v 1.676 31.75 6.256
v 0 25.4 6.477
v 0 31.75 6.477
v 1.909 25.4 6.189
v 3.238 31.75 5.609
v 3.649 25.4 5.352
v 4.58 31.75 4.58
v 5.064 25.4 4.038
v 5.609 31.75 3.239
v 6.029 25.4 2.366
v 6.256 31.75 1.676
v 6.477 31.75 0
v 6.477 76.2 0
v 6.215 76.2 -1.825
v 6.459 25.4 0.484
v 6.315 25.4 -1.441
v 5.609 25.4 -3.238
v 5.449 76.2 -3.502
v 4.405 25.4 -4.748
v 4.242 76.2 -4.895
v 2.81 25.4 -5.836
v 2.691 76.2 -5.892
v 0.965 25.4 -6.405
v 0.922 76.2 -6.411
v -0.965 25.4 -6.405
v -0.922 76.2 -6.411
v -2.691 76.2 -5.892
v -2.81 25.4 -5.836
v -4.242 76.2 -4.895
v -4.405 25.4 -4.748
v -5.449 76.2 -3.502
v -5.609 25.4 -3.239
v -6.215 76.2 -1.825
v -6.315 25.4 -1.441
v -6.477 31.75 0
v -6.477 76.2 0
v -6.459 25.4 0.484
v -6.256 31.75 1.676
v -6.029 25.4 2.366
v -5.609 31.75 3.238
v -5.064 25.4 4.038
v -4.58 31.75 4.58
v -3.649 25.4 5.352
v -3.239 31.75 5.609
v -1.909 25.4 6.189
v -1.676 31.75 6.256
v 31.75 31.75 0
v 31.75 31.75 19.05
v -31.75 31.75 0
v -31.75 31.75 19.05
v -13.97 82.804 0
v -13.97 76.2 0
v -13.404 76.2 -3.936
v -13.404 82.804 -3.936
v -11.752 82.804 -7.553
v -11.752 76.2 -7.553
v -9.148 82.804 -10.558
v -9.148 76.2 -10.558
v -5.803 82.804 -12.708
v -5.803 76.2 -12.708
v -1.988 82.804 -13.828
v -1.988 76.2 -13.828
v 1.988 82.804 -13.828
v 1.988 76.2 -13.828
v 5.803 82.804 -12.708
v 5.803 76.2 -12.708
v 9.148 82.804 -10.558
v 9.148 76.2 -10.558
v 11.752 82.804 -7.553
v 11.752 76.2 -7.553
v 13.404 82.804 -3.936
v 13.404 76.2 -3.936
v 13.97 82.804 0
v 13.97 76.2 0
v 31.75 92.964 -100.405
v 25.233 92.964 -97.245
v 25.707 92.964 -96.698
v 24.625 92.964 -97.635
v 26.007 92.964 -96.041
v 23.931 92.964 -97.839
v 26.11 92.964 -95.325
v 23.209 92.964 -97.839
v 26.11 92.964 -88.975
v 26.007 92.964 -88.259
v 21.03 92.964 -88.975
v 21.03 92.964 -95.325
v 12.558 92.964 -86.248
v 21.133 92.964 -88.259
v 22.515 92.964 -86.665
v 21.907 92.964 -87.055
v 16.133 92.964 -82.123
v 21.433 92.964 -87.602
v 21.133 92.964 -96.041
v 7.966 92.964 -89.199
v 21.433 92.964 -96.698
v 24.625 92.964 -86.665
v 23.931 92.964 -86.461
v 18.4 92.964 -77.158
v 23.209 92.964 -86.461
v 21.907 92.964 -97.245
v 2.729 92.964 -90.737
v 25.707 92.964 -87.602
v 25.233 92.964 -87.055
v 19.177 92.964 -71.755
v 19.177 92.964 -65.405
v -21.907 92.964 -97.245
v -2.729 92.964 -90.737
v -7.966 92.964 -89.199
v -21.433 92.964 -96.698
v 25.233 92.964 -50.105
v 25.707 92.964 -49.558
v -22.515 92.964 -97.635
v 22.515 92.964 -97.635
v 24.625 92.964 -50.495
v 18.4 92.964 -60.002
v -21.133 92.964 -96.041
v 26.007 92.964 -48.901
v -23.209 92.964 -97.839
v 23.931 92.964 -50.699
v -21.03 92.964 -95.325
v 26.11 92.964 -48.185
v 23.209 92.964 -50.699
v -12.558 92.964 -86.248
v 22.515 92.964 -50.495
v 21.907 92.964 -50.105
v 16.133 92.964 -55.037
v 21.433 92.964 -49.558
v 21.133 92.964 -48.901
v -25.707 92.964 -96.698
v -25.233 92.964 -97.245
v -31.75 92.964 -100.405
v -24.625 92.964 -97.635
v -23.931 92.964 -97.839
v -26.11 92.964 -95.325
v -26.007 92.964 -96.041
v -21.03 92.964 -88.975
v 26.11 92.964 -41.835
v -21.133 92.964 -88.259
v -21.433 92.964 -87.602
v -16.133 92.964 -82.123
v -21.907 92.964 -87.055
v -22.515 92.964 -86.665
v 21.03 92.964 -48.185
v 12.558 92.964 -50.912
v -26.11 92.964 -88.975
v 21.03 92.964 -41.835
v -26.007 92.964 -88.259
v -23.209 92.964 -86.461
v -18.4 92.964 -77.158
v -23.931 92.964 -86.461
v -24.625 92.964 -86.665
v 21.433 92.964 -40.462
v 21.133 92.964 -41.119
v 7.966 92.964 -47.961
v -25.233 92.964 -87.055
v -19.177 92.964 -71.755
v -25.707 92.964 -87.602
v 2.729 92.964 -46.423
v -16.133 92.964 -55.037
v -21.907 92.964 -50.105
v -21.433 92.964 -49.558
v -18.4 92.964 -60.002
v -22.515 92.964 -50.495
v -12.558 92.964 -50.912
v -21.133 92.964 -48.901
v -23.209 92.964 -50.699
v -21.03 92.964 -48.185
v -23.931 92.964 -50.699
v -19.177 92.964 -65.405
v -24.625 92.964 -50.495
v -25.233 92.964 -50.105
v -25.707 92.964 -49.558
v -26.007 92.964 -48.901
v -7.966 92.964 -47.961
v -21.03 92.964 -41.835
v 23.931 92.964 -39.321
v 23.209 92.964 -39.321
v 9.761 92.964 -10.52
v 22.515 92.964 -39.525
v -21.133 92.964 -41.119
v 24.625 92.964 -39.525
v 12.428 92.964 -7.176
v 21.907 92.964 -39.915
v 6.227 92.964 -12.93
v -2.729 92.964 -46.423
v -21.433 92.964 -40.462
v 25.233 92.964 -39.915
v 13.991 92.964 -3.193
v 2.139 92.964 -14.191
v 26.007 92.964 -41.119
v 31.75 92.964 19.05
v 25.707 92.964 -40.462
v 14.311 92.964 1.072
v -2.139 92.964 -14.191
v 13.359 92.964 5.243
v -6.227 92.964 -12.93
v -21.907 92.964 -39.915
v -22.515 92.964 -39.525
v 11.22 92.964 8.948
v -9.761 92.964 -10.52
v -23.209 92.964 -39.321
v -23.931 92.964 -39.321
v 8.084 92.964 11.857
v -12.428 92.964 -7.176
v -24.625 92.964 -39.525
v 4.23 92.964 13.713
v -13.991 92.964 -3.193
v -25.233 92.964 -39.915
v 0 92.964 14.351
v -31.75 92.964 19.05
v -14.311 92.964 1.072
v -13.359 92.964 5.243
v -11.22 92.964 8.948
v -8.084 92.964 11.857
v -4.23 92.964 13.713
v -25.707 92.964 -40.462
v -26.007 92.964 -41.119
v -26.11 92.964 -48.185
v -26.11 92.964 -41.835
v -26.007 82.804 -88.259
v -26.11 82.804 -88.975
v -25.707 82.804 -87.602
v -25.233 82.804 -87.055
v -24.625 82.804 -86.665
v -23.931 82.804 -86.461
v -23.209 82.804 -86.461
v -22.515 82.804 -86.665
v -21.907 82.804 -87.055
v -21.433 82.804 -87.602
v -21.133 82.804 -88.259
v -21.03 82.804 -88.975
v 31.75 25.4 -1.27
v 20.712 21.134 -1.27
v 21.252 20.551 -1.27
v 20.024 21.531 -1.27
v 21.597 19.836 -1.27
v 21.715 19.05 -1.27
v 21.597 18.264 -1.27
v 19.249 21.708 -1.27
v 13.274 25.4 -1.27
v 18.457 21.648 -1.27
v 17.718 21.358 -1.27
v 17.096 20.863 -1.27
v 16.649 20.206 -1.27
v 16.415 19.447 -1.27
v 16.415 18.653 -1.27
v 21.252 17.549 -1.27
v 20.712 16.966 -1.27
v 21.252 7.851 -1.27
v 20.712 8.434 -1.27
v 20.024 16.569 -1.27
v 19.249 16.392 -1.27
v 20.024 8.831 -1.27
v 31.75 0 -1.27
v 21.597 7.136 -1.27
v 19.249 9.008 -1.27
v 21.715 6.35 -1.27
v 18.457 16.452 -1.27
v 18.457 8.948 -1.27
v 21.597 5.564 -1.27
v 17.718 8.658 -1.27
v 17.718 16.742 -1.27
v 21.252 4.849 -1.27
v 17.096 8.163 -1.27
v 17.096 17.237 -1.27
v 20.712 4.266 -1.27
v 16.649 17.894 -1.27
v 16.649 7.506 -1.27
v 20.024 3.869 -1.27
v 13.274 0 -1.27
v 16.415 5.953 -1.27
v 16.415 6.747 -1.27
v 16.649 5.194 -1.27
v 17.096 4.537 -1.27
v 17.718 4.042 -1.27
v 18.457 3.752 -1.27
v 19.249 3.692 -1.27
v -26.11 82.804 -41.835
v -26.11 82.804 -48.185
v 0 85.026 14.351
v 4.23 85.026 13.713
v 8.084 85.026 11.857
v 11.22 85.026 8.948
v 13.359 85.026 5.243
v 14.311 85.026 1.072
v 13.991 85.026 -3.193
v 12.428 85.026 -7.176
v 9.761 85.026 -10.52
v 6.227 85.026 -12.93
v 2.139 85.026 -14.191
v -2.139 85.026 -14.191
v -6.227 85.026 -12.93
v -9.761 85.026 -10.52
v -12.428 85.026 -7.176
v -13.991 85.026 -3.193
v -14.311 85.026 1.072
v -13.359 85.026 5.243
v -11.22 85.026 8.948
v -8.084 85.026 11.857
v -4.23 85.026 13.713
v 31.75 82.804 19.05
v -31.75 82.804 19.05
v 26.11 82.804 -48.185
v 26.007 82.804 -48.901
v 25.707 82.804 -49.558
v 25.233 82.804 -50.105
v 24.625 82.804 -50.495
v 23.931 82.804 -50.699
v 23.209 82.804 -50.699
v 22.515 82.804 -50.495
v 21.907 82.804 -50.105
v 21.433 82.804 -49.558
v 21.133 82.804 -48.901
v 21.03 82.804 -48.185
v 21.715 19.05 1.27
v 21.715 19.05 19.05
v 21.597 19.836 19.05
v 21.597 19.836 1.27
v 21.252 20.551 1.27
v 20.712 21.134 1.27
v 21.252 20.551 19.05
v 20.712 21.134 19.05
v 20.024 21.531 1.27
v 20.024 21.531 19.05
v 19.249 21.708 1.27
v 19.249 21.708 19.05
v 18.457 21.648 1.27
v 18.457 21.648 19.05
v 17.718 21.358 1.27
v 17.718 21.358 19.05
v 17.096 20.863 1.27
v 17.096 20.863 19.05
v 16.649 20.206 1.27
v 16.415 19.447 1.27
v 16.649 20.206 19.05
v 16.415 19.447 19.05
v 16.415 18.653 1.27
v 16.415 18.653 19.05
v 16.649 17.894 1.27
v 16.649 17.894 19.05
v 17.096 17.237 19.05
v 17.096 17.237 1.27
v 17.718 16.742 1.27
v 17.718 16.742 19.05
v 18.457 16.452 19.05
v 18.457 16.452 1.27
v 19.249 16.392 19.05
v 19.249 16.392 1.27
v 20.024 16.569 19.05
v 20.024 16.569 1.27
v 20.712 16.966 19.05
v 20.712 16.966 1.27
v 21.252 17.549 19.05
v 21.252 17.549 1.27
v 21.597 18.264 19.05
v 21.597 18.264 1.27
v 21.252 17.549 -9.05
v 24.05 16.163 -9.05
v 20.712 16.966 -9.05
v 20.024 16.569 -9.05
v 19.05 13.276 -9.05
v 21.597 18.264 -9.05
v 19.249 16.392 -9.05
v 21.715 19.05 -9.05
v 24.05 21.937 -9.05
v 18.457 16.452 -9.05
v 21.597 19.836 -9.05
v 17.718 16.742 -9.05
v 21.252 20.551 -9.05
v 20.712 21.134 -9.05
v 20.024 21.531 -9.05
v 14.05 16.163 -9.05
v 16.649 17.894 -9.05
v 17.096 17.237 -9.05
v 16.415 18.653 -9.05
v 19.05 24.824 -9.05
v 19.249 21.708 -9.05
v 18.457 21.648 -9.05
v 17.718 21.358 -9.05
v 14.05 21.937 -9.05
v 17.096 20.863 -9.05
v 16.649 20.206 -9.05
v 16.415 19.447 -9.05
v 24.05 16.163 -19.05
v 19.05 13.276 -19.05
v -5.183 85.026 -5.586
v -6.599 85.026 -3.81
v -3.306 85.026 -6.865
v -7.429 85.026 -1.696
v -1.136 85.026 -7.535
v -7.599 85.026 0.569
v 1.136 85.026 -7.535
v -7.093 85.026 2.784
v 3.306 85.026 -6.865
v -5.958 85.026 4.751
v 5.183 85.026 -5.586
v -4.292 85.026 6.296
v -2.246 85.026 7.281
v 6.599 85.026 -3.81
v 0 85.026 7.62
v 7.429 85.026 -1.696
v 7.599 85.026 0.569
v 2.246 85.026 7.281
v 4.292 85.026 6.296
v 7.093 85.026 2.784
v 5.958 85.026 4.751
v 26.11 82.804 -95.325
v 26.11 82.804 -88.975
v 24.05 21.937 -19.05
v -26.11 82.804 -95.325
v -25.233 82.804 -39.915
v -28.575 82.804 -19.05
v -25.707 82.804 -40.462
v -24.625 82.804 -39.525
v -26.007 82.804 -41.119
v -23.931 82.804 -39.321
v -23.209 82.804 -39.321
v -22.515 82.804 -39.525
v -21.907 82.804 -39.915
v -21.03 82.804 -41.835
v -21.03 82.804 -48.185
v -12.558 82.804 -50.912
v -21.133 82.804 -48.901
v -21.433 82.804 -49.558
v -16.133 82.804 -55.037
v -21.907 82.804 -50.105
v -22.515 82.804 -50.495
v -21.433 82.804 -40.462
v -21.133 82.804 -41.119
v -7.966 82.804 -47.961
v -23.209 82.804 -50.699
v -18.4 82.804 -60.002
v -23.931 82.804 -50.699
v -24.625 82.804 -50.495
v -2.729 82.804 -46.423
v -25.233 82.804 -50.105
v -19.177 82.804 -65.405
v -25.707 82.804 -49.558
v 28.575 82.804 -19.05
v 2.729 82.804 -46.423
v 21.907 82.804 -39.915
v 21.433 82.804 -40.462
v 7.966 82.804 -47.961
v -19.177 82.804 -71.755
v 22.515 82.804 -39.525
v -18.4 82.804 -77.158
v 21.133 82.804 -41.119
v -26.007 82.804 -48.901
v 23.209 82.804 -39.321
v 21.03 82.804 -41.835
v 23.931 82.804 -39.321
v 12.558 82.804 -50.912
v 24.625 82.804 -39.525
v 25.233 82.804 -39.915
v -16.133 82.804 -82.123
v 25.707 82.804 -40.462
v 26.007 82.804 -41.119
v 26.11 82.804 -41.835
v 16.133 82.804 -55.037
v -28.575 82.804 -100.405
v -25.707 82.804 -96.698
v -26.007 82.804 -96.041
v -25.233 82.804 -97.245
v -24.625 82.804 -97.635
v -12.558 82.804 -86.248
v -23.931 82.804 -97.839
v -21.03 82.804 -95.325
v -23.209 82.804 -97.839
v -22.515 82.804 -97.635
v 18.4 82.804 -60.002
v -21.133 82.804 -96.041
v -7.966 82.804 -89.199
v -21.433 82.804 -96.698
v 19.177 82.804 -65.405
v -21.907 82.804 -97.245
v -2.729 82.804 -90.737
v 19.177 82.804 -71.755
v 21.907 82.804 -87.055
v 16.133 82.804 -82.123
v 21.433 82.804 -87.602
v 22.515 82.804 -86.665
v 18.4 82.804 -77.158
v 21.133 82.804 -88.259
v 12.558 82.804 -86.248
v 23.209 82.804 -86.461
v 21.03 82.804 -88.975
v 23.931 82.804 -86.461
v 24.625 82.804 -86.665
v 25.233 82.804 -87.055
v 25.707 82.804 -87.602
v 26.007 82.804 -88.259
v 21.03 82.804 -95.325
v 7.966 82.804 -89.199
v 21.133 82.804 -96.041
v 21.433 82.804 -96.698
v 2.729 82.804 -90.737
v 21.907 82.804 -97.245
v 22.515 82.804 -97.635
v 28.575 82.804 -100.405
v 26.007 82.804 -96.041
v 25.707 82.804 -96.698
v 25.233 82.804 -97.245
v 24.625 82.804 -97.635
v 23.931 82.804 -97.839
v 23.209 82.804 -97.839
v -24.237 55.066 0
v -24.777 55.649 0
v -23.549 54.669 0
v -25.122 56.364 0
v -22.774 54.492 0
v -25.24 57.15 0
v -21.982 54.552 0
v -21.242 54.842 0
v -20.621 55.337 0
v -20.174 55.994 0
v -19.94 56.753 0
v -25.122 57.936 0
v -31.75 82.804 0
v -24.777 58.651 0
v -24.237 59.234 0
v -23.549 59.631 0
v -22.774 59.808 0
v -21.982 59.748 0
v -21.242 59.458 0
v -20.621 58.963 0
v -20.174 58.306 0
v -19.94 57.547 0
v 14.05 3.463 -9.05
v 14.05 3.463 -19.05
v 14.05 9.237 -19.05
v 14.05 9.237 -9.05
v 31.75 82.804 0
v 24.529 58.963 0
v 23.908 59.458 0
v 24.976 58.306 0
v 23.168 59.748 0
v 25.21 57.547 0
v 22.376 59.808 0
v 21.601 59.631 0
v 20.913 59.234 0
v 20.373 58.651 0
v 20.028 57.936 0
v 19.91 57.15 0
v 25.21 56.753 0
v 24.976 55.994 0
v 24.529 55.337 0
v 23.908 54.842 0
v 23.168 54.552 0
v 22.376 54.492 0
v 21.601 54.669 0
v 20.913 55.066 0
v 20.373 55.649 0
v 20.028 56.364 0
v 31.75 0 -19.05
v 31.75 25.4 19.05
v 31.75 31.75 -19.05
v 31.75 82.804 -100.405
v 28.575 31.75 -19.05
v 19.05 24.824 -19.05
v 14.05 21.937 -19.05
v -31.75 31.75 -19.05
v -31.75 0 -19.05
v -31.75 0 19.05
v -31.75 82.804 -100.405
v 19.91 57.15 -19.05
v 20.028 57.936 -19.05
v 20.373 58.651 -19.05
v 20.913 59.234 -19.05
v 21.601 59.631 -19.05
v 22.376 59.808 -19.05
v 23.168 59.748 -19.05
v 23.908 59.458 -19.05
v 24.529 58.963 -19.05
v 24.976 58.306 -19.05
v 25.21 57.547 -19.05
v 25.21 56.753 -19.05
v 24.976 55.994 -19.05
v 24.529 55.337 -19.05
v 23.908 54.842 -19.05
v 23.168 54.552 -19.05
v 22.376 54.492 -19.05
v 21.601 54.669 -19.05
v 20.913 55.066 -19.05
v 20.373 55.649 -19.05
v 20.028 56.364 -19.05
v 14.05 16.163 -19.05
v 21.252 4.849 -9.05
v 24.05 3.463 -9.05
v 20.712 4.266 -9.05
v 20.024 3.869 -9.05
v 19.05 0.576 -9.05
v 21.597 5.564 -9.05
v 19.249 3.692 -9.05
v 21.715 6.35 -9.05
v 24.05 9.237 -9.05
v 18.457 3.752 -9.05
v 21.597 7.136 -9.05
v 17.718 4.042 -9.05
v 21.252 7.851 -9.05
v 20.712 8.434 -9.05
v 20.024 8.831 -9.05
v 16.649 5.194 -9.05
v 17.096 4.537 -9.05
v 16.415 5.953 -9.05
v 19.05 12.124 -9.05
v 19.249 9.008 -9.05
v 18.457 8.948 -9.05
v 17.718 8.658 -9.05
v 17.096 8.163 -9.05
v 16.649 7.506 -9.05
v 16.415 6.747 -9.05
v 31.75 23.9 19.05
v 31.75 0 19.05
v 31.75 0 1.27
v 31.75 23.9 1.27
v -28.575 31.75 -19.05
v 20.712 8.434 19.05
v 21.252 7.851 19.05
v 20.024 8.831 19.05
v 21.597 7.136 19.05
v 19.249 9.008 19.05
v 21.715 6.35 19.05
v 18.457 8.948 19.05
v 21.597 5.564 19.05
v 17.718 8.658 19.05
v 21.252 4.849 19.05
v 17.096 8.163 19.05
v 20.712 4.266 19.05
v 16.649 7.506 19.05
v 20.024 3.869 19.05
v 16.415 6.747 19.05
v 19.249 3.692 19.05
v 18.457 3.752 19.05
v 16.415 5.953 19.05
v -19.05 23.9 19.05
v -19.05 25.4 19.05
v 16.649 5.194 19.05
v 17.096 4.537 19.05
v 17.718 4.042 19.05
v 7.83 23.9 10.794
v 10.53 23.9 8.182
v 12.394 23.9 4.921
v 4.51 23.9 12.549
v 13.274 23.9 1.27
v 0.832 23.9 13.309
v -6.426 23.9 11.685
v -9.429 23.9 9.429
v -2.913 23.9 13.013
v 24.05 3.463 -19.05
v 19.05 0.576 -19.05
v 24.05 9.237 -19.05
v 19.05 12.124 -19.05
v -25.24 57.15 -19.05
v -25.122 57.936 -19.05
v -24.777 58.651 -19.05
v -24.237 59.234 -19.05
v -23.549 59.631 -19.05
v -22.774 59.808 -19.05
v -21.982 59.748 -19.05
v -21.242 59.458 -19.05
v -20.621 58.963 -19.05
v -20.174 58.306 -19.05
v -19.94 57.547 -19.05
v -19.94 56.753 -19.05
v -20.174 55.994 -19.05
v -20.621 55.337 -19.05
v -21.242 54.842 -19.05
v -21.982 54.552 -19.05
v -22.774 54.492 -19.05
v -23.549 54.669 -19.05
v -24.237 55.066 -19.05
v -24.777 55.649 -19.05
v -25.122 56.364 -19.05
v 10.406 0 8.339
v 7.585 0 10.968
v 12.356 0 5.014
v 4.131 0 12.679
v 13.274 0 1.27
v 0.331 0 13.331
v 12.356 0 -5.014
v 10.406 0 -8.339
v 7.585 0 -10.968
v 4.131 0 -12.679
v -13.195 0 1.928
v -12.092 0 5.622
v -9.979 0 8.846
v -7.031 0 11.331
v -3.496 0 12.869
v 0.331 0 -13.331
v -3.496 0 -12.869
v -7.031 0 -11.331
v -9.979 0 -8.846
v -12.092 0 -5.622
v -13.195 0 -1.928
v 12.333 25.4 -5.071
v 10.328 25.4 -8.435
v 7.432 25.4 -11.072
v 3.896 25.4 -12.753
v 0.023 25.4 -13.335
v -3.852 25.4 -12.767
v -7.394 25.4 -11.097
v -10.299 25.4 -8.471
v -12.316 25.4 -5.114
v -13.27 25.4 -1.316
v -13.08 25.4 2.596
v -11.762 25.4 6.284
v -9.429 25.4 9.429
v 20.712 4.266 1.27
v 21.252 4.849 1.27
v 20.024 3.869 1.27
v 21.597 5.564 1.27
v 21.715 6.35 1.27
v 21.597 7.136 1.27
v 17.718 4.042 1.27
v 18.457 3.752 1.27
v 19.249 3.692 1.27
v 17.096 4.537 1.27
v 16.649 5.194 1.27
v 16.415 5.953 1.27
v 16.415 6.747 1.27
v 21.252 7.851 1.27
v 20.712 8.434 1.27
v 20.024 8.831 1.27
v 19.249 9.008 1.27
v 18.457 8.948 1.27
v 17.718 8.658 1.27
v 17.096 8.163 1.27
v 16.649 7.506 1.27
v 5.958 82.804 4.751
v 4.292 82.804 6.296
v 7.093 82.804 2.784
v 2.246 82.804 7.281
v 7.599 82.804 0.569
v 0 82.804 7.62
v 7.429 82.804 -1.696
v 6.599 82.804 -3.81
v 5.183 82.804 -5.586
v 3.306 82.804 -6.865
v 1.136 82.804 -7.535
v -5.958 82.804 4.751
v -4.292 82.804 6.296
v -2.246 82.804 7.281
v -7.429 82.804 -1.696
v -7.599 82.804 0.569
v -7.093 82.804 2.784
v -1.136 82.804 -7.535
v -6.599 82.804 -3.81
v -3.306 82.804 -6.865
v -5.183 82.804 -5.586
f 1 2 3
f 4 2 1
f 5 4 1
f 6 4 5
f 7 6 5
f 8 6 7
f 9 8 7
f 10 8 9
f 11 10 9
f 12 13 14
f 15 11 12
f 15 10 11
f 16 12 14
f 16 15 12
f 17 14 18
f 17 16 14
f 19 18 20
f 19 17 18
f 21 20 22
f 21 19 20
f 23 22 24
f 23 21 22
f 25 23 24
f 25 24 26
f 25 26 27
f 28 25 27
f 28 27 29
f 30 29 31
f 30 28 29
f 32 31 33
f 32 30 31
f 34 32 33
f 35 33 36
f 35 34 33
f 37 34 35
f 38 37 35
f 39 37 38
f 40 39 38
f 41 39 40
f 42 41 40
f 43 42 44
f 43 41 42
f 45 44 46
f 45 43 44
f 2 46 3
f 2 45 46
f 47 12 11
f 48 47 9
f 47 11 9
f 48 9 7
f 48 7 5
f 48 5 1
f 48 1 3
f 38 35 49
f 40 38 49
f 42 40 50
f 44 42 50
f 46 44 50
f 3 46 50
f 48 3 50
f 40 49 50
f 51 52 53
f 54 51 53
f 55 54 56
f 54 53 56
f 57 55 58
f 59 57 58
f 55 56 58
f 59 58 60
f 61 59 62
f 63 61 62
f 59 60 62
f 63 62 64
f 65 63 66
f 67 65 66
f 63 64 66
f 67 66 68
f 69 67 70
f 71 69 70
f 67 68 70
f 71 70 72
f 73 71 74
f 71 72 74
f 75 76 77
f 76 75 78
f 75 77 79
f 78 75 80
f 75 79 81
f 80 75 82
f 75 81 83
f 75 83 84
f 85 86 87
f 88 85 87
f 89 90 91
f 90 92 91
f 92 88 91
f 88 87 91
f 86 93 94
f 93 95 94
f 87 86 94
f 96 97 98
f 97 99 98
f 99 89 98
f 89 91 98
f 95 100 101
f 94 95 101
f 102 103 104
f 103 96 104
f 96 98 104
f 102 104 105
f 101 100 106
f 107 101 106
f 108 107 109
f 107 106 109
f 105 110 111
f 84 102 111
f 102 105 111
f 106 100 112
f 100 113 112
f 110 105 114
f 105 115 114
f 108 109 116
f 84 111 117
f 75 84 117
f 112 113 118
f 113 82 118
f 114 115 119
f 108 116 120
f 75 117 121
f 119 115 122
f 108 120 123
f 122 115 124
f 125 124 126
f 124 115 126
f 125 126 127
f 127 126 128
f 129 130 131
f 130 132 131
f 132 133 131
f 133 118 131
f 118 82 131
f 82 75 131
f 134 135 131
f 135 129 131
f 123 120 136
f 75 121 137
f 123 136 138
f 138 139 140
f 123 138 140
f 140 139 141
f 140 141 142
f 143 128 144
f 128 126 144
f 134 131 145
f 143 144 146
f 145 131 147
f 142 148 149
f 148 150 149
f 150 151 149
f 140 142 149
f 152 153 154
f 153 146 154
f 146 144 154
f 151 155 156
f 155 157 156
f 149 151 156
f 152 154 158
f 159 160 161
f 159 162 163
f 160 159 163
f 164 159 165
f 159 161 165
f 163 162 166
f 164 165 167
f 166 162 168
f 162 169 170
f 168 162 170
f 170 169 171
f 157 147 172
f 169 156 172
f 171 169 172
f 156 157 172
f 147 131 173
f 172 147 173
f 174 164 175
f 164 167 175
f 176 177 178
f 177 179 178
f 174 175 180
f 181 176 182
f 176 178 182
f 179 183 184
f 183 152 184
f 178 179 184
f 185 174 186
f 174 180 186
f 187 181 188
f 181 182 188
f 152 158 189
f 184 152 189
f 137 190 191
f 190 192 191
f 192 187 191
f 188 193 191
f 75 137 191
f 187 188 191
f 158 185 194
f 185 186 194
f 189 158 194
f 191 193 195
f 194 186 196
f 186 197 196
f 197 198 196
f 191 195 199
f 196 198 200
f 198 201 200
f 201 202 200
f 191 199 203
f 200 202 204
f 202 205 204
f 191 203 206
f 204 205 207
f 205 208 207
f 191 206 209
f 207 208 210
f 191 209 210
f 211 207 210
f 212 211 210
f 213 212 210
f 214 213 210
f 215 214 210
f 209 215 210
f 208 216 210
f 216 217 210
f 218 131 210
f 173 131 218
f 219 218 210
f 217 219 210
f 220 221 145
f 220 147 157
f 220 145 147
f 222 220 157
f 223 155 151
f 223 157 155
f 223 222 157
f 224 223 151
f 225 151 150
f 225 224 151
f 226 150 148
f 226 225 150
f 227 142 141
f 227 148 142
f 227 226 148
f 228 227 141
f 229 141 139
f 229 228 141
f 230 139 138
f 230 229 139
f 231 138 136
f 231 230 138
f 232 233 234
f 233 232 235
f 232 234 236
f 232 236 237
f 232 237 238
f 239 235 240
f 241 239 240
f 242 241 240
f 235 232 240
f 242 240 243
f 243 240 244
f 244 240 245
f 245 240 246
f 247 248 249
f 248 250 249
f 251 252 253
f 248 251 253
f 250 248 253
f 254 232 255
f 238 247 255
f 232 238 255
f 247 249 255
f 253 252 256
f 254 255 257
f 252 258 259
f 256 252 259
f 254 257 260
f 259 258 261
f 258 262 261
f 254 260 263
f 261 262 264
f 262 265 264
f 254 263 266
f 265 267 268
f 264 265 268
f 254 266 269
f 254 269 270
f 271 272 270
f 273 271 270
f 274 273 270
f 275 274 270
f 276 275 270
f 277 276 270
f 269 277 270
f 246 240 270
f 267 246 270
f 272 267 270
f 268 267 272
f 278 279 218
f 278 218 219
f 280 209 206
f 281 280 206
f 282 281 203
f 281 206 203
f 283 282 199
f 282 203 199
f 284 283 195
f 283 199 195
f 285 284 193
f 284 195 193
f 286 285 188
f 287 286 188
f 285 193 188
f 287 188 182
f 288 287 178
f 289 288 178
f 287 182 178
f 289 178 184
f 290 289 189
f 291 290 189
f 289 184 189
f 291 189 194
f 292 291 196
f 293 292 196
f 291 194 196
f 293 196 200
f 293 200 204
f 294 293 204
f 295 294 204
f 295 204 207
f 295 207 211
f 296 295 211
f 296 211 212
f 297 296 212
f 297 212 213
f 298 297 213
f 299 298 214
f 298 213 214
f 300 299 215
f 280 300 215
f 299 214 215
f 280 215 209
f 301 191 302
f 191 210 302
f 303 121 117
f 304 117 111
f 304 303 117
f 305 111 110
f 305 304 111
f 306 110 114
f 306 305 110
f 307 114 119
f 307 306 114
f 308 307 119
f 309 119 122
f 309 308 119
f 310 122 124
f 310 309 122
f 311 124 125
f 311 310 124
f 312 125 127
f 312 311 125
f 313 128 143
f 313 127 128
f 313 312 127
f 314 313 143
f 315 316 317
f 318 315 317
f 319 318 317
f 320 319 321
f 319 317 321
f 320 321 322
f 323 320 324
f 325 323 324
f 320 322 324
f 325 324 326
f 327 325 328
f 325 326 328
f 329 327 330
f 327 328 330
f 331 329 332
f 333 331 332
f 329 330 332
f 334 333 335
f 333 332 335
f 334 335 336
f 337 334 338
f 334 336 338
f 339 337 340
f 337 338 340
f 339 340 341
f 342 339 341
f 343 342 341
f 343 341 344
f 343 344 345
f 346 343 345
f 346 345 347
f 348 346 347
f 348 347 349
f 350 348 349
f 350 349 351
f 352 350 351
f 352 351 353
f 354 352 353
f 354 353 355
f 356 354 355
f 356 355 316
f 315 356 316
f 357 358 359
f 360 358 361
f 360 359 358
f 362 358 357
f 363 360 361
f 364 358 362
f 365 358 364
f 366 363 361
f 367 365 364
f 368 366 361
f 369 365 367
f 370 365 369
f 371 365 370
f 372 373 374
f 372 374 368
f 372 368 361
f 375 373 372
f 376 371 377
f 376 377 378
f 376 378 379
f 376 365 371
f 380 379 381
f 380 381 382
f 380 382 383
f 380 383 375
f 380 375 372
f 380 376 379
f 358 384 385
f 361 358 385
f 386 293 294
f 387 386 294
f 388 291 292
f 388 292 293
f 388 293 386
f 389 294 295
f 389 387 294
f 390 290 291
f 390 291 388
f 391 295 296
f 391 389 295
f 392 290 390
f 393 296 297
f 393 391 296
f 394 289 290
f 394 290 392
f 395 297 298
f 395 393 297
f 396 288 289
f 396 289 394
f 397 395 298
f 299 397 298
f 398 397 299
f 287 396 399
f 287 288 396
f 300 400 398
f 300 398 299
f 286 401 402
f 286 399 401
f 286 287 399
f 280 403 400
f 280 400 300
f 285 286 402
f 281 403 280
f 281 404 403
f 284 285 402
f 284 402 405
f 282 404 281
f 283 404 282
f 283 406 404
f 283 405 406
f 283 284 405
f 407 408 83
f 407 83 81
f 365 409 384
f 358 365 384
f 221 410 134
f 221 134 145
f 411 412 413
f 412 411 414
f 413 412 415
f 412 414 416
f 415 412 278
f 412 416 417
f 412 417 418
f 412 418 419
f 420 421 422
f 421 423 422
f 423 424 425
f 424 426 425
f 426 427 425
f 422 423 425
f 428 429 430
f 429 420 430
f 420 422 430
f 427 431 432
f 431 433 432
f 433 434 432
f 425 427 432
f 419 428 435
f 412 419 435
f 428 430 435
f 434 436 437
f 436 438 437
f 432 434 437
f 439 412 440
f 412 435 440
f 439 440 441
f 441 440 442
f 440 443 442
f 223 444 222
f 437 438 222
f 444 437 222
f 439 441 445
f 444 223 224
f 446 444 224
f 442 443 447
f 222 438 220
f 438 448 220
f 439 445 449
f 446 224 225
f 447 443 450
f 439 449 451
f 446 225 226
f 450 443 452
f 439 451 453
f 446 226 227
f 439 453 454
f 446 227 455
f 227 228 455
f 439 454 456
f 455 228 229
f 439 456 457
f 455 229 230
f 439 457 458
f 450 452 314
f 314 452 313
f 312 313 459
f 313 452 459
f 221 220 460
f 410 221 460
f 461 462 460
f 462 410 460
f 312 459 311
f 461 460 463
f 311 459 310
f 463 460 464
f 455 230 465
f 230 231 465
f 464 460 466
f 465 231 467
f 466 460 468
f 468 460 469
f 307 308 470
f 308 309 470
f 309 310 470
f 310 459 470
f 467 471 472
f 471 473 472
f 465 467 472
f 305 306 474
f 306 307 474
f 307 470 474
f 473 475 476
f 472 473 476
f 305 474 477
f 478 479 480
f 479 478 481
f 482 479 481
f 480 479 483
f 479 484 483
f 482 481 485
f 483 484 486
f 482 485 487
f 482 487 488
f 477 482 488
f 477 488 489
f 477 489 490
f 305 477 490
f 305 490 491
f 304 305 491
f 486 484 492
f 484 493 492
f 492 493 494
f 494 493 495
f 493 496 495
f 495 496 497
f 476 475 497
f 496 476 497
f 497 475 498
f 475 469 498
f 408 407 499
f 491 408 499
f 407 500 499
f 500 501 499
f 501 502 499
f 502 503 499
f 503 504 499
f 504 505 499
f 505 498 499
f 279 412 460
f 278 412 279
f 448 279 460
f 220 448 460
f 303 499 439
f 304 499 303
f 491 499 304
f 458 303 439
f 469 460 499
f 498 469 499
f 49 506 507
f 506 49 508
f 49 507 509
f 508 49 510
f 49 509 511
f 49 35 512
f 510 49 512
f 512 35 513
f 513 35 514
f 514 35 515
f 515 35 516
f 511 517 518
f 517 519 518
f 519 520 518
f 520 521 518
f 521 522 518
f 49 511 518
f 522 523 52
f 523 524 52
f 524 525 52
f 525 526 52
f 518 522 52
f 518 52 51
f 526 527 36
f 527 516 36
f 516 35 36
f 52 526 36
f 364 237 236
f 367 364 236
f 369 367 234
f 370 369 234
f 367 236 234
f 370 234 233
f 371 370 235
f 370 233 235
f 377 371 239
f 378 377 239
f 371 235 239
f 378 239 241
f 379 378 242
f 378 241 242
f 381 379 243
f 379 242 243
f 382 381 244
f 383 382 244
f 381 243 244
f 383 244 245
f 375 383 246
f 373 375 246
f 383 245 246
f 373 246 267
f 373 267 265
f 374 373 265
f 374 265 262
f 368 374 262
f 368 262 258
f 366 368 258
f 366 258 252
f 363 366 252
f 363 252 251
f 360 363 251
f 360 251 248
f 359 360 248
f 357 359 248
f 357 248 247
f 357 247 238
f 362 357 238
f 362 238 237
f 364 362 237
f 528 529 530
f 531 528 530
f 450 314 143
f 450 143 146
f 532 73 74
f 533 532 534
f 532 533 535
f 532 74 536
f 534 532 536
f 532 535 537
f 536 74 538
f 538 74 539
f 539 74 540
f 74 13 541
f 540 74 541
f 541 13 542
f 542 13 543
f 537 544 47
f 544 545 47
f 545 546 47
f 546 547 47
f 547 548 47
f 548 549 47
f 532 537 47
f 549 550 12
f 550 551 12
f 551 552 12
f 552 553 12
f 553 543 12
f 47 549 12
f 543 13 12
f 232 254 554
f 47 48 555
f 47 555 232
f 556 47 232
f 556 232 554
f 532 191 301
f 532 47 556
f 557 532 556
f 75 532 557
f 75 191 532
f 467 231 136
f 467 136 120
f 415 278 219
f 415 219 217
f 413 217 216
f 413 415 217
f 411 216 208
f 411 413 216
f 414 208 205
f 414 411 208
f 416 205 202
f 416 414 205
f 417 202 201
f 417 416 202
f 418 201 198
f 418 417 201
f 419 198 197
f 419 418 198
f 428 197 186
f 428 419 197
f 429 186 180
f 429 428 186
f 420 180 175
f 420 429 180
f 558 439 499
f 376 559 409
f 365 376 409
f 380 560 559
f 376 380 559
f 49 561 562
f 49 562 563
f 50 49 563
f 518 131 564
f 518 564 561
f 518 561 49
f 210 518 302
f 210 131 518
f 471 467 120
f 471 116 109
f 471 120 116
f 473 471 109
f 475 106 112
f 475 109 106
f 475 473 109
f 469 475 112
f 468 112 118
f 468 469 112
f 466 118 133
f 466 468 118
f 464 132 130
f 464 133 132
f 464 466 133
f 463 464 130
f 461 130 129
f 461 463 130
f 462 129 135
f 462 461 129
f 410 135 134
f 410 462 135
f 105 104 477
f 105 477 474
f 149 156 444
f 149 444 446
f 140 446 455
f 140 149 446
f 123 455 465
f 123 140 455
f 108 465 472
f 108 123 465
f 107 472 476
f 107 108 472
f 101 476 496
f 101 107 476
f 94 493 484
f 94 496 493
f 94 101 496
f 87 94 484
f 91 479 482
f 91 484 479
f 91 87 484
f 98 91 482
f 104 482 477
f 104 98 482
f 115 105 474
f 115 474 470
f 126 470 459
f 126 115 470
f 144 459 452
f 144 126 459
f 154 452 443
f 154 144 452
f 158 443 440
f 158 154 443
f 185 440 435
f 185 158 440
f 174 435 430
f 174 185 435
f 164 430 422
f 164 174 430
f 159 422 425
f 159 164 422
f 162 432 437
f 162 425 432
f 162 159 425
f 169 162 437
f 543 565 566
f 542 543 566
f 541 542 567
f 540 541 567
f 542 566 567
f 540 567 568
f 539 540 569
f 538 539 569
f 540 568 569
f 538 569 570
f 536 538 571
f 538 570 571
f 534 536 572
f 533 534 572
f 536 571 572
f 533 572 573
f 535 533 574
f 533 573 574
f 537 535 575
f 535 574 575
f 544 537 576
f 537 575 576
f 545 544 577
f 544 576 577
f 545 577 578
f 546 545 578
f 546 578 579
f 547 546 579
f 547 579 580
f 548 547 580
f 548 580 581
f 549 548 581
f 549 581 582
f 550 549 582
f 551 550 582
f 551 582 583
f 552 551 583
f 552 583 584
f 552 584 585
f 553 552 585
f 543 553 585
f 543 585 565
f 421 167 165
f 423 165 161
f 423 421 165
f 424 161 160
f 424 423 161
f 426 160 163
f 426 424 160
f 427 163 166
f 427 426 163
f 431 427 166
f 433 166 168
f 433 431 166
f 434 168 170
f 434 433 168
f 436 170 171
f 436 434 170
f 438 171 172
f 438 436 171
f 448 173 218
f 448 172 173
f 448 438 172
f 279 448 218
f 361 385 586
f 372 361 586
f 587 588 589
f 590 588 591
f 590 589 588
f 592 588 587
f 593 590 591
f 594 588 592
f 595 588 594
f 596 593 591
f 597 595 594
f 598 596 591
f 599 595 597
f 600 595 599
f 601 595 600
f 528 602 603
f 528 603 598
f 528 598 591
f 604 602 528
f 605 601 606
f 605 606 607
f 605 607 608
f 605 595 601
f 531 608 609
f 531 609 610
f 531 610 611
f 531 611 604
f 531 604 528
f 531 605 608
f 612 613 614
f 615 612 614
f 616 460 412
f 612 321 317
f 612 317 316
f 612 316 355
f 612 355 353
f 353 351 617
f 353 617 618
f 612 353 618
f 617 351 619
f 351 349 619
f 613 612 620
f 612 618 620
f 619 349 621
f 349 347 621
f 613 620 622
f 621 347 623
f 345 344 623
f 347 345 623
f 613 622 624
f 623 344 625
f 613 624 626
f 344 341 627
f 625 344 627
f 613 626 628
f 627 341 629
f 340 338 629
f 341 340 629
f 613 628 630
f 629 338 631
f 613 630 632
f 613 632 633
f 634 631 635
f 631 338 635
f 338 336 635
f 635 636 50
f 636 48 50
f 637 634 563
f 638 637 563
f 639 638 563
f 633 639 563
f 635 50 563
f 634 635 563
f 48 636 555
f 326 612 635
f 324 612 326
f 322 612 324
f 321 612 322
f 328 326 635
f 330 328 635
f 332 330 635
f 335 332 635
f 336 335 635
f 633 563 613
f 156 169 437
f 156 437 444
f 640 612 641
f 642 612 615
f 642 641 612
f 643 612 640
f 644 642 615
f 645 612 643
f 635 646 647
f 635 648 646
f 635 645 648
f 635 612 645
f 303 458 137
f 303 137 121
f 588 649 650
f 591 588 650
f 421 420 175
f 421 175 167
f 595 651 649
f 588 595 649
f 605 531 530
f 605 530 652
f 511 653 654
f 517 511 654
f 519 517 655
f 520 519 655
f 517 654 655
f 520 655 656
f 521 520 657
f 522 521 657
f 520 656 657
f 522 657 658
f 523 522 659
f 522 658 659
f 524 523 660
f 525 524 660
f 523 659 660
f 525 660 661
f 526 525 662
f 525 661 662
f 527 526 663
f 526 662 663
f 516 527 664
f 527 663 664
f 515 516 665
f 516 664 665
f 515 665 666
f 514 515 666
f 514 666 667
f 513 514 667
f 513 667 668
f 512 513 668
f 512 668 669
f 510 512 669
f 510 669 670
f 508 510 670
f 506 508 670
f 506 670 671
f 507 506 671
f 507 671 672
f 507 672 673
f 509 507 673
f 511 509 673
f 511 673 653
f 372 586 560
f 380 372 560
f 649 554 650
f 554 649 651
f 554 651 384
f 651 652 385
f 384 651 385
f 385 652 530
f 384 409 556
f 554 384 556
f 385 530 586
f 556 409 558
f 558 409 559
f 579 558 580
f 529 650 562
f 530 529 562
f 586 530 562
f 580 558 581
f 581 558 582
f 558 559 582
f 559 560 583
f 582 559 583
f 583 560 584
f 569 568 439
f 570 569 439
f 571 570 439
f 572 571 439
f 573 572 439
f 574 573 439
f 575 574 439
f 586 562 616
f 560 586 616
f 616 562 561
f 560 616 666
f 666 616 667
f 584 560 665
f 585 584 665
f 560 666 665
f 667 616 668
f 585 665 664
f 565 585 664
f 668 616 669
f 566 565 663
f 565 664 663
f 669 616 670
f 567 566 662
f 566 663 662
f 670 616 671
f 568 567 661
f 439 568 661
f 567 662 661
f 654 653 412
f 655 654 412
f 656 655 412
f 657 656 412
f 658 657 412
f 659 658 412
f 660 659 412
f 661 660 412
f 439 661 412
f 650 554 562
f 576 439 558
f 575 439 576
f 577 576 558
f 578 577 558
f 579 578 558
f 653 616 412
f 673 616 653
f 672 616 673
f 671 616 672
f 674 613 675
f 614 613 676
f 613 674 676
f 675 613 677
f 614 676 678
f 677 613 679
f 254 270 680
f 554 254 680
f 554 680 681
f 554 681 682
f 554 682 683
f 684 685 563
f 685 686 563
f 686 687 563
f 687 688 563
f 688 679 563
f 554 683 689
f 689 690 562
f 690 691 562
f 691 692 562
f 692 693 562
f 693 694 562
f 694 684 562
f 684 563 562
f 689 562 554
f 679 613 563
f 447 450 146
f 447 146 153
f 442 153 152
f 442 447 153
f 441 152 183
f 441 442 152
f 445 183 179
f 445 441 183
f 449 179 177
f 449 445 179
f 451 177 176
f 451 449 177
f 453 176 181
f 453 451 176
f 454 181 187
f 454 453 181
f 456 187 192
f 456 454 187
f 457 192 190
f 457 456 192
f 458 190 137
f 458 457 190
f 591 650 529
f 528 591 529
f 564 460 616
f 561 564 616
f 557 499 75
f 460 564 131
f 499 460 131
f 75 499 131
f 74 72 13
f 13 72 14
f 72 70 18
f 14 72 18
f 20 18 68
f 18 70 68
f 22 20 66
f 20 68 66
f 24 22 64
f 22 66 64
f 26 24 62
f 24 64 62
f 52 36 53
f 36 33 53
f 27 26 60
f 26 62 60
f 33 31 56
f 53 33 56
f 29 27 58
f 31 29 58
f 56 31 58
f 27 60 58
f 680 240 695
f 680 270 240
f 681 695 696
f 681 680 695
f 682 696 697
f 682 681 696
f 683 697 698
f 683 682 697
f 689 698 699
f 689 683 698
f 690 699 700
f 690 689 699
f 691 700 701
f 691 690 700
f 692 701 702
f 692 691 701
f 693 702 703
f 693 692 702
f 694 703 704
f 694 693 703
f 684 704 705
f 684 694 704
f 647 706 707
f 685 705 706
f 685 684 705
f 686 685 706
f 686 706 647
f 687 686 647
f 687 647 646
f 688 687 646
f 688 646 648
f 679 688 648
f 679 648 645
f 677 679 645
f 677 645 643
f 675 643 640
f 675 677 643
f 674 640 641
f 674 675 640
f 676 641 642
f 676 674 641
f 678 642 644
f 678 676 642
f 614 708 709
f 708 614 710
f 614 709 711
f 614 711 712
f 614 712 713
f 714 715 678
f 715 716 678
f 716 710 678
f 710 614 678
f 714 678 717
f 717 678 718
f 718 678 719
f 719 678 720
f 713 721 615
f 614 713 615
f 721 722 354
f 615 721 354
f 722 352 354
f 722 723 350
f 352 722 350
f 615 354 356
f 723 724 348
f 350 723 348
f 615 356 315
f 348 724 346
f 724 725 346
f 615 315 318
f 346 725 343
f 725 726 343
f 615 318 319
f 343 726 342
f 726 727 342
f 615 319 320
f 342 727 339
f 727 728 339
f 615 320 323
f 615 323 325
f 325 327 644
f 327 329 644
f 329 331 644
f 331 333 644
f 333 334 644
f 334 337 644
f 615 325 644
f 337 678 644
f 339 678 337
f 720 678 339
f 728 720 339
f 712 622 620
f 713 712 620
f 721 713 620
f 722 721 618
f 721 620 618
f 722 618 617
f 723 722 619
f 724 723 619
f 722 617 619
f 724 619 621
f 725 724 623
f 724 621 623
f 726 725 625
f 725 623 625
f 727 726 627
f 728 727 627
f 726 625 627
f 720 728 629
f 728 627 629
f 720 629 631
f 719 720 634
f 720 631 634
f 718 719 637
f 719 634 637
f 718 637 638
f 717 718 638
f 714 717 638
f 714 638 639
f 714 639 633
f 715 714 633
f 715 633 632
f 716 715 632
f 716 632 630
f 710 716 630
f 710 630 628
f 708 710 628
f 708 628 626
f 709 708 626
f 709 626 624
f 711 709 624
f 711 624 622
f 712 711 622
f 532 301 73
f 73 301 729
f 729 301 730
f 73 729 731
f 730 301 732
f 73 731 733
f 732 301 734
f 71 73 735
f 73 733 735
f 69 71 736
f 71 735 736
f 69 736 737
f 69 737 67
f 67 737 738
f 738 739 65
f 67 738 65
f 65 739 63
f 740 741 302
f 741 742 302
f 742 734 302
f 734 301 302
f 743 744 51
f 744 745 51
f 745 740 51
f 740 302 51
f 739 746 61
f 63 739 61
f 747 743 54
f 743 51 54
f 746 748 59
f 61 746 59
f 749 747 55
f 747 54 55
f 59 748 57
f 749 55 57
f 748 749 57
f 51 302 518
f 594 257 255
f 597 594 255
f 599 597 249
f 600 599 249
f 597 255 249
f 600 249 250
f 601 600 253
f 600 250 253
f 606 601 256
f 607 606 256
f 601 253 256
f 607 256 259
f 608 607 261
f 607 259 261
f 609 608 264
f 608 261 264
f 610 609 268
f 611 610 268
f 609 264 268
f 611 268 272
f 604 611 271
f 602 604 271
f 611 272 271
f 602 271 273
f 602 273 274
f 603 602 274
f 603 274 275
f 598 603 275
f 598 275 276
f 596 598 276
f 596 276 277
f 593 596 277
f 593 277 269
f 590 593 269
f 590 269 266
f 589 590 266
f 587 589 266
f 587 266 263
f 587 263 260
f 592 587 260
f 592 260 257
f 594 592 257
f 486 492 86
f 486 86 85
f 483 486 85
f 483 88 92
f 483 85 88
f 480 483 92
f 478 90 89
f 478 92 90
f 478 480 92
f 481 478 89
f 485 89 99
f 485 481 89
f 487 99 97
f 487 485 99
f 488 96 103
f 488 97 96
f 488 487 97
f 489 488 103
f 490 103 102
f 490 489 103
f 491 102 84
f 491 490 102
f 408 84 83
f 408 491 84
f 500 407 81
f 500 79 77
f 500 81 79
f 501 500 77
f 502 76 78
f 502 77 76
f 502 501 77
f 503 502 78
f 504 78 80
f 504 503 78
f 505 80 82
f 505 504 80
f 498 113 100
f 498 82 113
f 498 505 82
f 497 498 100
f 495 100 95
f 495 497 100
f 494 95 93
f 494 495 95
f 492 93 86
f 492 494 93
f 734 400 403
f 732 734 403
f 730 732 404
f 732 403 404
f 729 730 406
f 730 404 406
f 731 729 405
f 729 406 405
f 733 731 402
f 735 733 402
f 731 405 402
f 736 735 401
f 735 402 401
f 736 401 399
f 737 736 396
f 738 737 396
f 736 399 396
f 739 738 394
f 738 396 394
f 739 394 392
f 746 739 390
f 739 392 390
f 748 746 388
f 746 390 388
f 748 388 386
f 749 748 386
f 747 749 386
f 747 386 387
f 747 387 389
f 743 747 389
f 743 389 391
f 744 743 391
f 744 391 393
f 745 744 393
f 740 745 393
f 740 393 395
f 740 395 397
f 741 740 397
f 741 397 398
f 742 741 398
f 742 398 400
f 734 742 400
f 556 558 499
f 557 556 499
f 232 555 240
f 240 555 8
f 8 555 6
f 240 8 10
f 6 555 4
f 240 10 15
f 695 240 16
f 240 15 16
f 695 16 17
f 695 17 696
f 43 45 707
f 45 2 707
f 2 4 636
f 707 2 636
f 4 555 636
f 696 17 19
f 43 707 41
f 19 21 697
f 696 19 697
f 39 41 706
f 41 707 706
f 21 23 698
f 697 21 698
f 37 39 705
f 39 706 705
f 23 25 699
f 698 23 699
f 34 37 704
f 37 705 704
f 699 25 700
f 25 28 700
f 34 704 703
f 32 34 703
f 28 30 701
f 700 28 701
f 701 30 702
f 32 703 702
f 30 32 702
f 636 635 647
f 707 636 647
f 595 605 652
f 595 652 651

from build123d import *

# Parameters (mm, degrees)
SKETCH1_W            = 50.8
SKETCH1_H            = 38.1
SKETCH1_R            = 13.335
BOSS_EXTRUDE2_DEPTH  = 25.4
CUT_EXTRUDE1_REACH   = 42.66
SKETCH2_W            = 25.4
SKETCH2_H            = 2.54
SKETCH3_R            = 2.665
CUT_EXTRUDE2_DEPTH   = 53.363441445
CUT_EXTRUDE3_DEPTH   = 10
CUT_EXTRUDE4_START   = -1.5
CUT_EXTRUDE4_DEPTH   = 1.5
SKETCH6_W            = 50.8
SKETCH6_H            = 38.1
SKETCH6_R            = 6.477
BOSS_EXTRUDE3_DEPTH  = 6.35
BOSS_EXTRUDE4_DEPTH  = 44.45
BOSS_EXTRUDE5_DEPTH  = 6.604
SKETCH11_W           = 57.15
SKETCH11_H           = 127
BOSS_EXTRUDE6_DEPTH  = 10.16
CUT_EXTRUDE6_REACH   = 147.3
SKETCH12_R           = 7.62
SKETCH13_R           = 14.351
CUT_EXTRUDE7_DEPTH   = 7.9375
CUT_EXTRUDE8_REACH   = 147.3
CUT_EXTRUDE11_REACH  = 141.019
CUT_EXTRUDE12_REACH  = 147.3
SKETCH16_W           = 57.15
SKETCH16_H           = 7.545
SKETCH17_W           = 17.78
SKETCH17_H           = 23.9
BOSS_EXTRUDE7_DEPTH  = 3.175
BOSS_EXTRUDE8_DEPTH  = 3.175
BOSS_EXTRUDE10_DEPTH = 3.175
SKETCH20_W           = 17.78
SKETCH20_H           = 23.9
BOSS_EXTRUDE11_DEPTH = 3.175
CUT_EXTRUDE13_REACH  = 129.55
SKETCH21_R           = 2.665


with BuildPart() as part:
    # Sketch1 → Boss-Extrude2 (new body)
    with BuildSketch(Plane(origin=(0, 0, 0), x_dir=(1, 0, 0), z_dir=(0, 1, 0))):
        Rectangle(SKETCH1_W, SKETCH1_H)
        with Locations(Location((0, 0, 0), (0, 0, 270))):
            Circle(SKETCH1_R, mode=Mode.SUBTRACT)
    extrude(amount=BOSS_EXTRUDE2_DEPTH)

    # Sketch2 → Cut-Extrude1 (cut, up to next)
    with BuildSketch(Plane(origin=(0, 25.4, 0), x_dir=(1, 0, 0), z_dir=(0, 1, 0)), mode=Mode.PRIVATE) as cut_extrude1_sk1:
        with Locations((12.7, 0)):
            Rectangle(SKETCH2_W, SKETCH2_H)
    cut_extrude1_tool1 = extrude(cut_extrude1_sk1.sketch, amount=-CUT_EXTRUDE1_REACH, mode=Mode.PRIVATE) & part.part
    add(cut_extrude1_tool1.solids().sort_by_distance((12.7, 25.4, 0))[0], mode=Mode.SUBTRACT)

    # Sketch3 → Cut-Extrude2 (cut, through all)
    with BuildSketch(Plane.XY.offset(19.05)):
        with Locations((19.05, 19.05)):
            Circle(SKETCH3_R)
        with Locations((19.05, 6.35)):
            Circle(SKETCH3_R)
    extrude(amount=-CUT_EXTRUDE2_DEPTH, mode=Mode.SUBTRACT)

    # Sketch4 → Cut-Extrude3 (cut)
    with BuildSketch(Plane(origin=(0, 0, -19.05), x_dir=(-1, 0, 0), z_dir=(0, 0, -1))):
        Polygon((-19.05, 24.823502692), (-24.05, 21.936751346), (-24.05, 16.163248654), (-19.05, 13.276497308), (-14.05, 16.163248654), (-14.05, 21.936751346), align=None)
        Polygon((-19.05, 12.123502692), (-24.05, 9.236751346), (-24.05, 3.463248654), (-19.05, 0.576497308), (-14.05, 3.463248654), (-14.05, 9.236751346), align=None)
    extrude(amount=-CUT_EXTRUDE3_DEPTH, mode=Mode.SUBTRACT)

    # Sketch5 → Cut-Extrude4 (cut)
    with BuildSketch(Plane(origin=(0, 25.4, 0), x_dir=(1, 0, 0), z_dir=(0, 1, 0)).offset(CUT_EXTRUDE4_START)):
        with BuildLine():
            Line((-19.05, -19.05), (-9.429268927, -9.429268927))
            ThreePointArc((-9.429268927, -9.429268927), (4.509949975, -12.549206199), (13.27438605, -1.27))
            Line((13.27438605, -1.27), (25.4, -1.27))
            Line((25.4, -1.27), (25.4, -19.05))
            Line((25.4, -19.05), (-19.05, -19.05))
        make_face()
    extrude(amount=CUT_EXTRUDE4_DEPTH, mode=Mode.SUBTRACT)

    # Sketch6 → Boss-Extrude3 (add)
    with BuildSketch(Plane(origin=(0, 25.4, 0), x_dir=(1, 0, 0), z_dir=(0, 1, 0))):
        Rectangle(SKETCH6_W, SKETCH6_H)
        with Locations(Location((0, 0, 0), (0, 0, 270))):
            Circle(SKETCH6_R, mode=Mode.SUBTRACT)
    extrude(amount=BOSS_EXTRUDE3_DEPTH)

    # Sketch8 → Boss-Extrude4 (add)
    with BuildSketch(Plane(origin=(0, 31.75, 0), x_dir=(1, 0, 0), z_dir=(0, 1, 0))):
        with BuildLine():
            Line((-25.4, 19.05), (25.4, 19.05))
            Line((25.4, 19.05), (25.4, 0))
            Line((25.4, 0), (6.477, 0))
            ThreePointArc((6.477, 0), (0, 6.477), (-6.477, 0))
            Line((-6.477, 0), (-25.4, 0))
            Line((-25.4, 0), (-25.4, 19.05))
        make_face()
    extrude(amount=BOSS_EXTRUDE4_DEPTH)

    # Sketch10 → Boss-Extrude5 (add)
    with BuildSketch(Plane(origin=(0, 76.2, 0), x_dir=(1, 0, 0), z_dir=(0, 1, 0))):
        with BuildLine():
            Line((-25.4, 19.05), (-25.4, 0))
            Line((-25.4, 0), (-13.97, 0))
            ThreePointArc((-13.97, 0), (0, 13.97), (13.97, 0))
            Line((13.97, 0), (25.4, 0))
            Line((25.4, 0), (25.4, 19.05))
            Line((25.4, 19.05), (-25.4, 19.05))
        make_face()
    extrude(amount=BOSS_EXTRUDE5_DEPTH)

    # Sketch11 → Boss-Extrude6 (add)
    with BuildSketch(Plane(origin=(0, 82.804, 0), x_dir=(1, 0, 0), z_dir=(0, 1, 0))):
        with Locations((0, 44.45)):
            Rectangle(SKETCH11_W, SKETCH11_H)
    extrude(amount=BOSS_EXTRUDE6_DEPTH)

    # Sketch12 → Cut-Extrude6 (cut, up to next)
    with BuildSketch(Plane(origin=(0, 92.964, 0), x_dir=(1, 0, 0), z_dir=(0, 1, 0)), mode=Mode.PRIVATE) as cut_extrude6_sk1:
        with Locations(Location((0, 0, 0), (0, 0, 270))):
            Circle(SKETCH12_R)
    cut_extrude6_tool1 = extrude(cut_extrude6_sk1.sketch, amount=-CUT_EXTRUDE6_REACH, mode=Mode.PRIVATE) & part.part
    add(cut_extrude6_tool1.solids().sort_by_distance((0, 92.964, 0))[0], mode=Mode.SUBTRACT)

    # Sketch13 → Cut-Extrude7 (cut)
    with BuildSketch(Plane(origin=(0, 92.964, 0), x_dir=(1, 0, 0), z_dir=(0, 1, 0))):
        with Locations(Location((0, 0, 0), (0, 0, 270))):
            Circle(SKETCH13_R)
    extrude(amount=-CUT_EXTRUDE7_DEPTH, mode=Mode.SUBTRACT)

    # Sketch14 → Cut-Extrude8 (cut, up to next)
    with BuildSketch(Plane(origin=(0, 92.964, 0), x_dir=(1, 0, 0), z_dir=(0, 1, 0)), mode=Mode.PRIVATE) as cut_extrude8_sk1:
        with BuildLine():
            Line((-19.177, 65.405), (-19.177, 71.755))
            ThreePointArc((-19.177, 71.755), (0, 90.932), (19.177, 71.755))
            Line((19.177, 71.755), (19.177, 65.405))
            ThreePointArc((19.177, 65.405), (0, 46.228), (-19.177, 65.405))
        make_face()
    cut_extrude8_tool1 = extrude(cut_extrude8_sk1.sketch, amount=-CUT_EXTRUDE8_REACH, mode=Mode.PRIVATE) & part.part
    add(cut_extrude8_tool1.solids().sort_by_distance((0, 92.964, -68.58))[0], mode=Mode.SUBTRACT)

    # Sketch15 → Cut-Extrude11 (cut, up to next)
    with BuildSketch(Plane.XZ.offset(-82.804), mode=Mode.PRIVATE) as cut_extrude11_sk1:
        with BuildLine():
            Line((-21.03, -88.975), (-21.03, -95.325))
            ThreePointArc((-21.03, -95.325), (-23.57, -97.865), (-26.11, -95.325))
            Line((-26.11, -95.325), (-26.11, -88.975))
            ThreePointArc((-26.11, -88.975), (-23.57, -86.435), (-21.03, -88.975))
        make_face()
    cut_extrude11_tool1 = extrude(cut_extrude11_sk1.sketch, amount=-CUT_EXTRUDE11_REACH, mode=Mode.PRIVATE) & part.part
    # Sketch15 → Cut-Extrude11 (cut, up to next)
    with BuildSketch(Plane.XZ.offset(-82.804), mode=Mode.PRIVATE) as cut_extrude11_sk2:
        with BuildLine():
            Line((26.11, -88.975), (26.11, -95.325))
            ThreePointArc((26.11, -95.325), (23.57, -97.865), (21.03, -95.325))
            Line((21.03, -95.325), (21.03, -88.975))
            ThreePointArc((21.03, -88.975), (23.57, -86.435), (26.11, -88.975))
        make_face()
    cut_extrude11_tool2 = extrude(cut_extrude11_sk2.sketch, amount=-CUT_EXTRUDE11_REACH, mode=Mode.PRIVATE) & part.part
    # Sketch15 → Cut-Extrude11 (cut, up to next)
    with BuildSketch(Plane.XZ.offset(-82.804), mode=Mode.PRIVATE) as cut_extrude11_sk3:
        with BuildLine():
            Line((26.11, -41.835), (26.11, -48.185))
            ThreePointArc((26.11, -48.185), (23.57, -50.725), (21.03, -48.185))
            Line((21.03, -48.185), (21.03, -41.835))
            ThreePointArc((21.03, -41.835), (23.57, -39.295), (26.11, -41.835))
        make_face()
    cut_extrude11_tool3 = extrude(cut_extrude11_sk3.sketch, amount=-CUT_EXTRUDE11_REACH, mode=Mode.PRIVATE) & part.part
    # Sketch15 → Cut-Extrude11 (cut, up to next)
    with BuildSketch(Plane.XZ.offset(-82.804), mode=Mode.PRIVATE) as cut_extrude11_sk4:
        with BuildLine():
            Line((-21.03, -41.835), (-21.03, -48.185))
            ThreePointArc((-21.03, -48.185), (-23.57, -50.725), (-26.11, -48.185))
            Line((-26.11, -48.185), (-26.11, -41.835))
            ThreePointArc((-26.11, -41.835), (-23.57, -39.295), (-21.03, -41.835))
        make_face()
    cut_extrude11_tool4 = extrude(cut_extrude11_sk4.sketch, amount=-CUT_EXTRUDE11_REACH, mode=Mode.PRIVATE) & part.part
    add(cut_extrude11_tool1.solids().sort_by_distance((-23.57, 82.804, -92.15))[0], mode=Mode.SUBTRACT)
    add(cut_extrude11_tool2.solids().sort_by_distance((23.57, 82.804, -92.15))[0], mode=Mode.SUBTRACT)
    add(cut_extrude11_tool3.solids().sort_by_distance((23.57, 82.804, -45.01))[0], mode=Mode.SUBTRACT)
    add(cut_extrude11_tool4.solids().sort_by_distance((-23.57, 82.804, -45.01))[0], mode=Mode.SUBTRACT)

    # Sketch16 → Cut-Extrude12 (cut, up to next)
    with BuildSketch(Plane(origin=(0, 92.964, 0), x_dir=(1, 0, 0), z_dir=(0, 1, 0)), mode=Mode.PRIVATE) as cut_extrude12_sk1:
        with Locations((0, 104.1775)):
            Rectangle(SKETCH16_W, SKETCH16_H)
    cut_extrude12_tool1 = extrude(cut_extrude12_sk1.sketch, amount=-CUT_EXTRUDE12_REACH, mode=Mode.PRIVATE) & part.part
    add(cut_extrude12_tool1.solids().sort_by_distance((0, 92.964, -104.1775))[0], mode=Mode.SUBTRACT)

    # Sketch17 → Boss-Extrude7 (add)
    with BuildSketch(Plane(origin=(25.4, 0, 0), x_dir=(0, 0, -1), z_dir=(1, 0, 0))):
        with Locations((-10.16, 11.95)):
            Rectangle(SKETCH17_W, SKETCH17_H)
        Polygon((19.05, 0), (19.05, 82.804), (0, 82.804), (0, 31.75), (-19.05, 31.75), (-19.05, 25.4), (1.27, 25.4), (1.27, 0), align=None)
    extrude(amount=BOSS_EXTRUDE7_DEPTH)

    # Sketch18 → Boss-Extrude8 (add)
    with BuildSketch(Plane.ZY.offset(25.4)):
        Polygon((-19.05, 0), (19.05, 0), (19.05, 31.75), (0, 31.75), (0, 82.804), (-19.05, 82.804), align=None)
    extrude(amount=BOSS_EXTRUDE8_DEPTH)

    # Sketch19 → Boss-Extrude10 (add)
    with BuildSketch(Plane.ZY.offset(28.575)):
        Polygon((0, 92.964), (-100.405, 92.964), (-100.405, 82.804), (-19.05, 82.804), (-19.05, 31.75), (0, 31.75), (0, 82.804), (19.05, 82.804), (19.05, 92.964), align=None)
        Polygon((0, 31.75), (-19.05, 31.75), (-19.05, 0), (19.05, 0), (19.05, 31.75), align=None)
        Polygon((-19.05, 82.804), (-100.405, 82.804), (-19.05, 31.75), align=None)
    extrude(amount=BOSS_EXTRUDE10_DEPTH)

    # Sketch20 → Boss-Extrude11 (add)
    with BuildSketch(Plane(origin=(28.575, 0, 0), x_dir=(0, 0, -1), z_dir=(1, 0, 0))):
        Polygon((19.05, 31.75), (100.405, 82.804), (100.405, 92.964), (-19.05, 92.964), (-19.05, 82.804), (0, 82.804), (0, 31.75), (-19.05, 31.75), (-19.05, 25.4), (1.27, 25.4), (1.27, 0), (19.05, 0), align=None)
        with Locations((-10.16, 11.95)):
            Rectangle(SKETCH20_W, SKETCH20_H)
    extrude(amount=BOSS_EXTRUDE11_DEPTH)

    # Sketch21 → Cut-Extrude13 (cut, up to next)
    with BuildSketch(Plane(origin=(0, 0, -19.05), x_dir=(-1, 0, 0), z_dir=(0, 0, -1)), mode=Mode.PRIVATE) as cut_extrude13_sk1:
        with Locations((22.575, 57.15)):
            Circle(SKETCH21_R)
    cut_extrude13_tool1 = extrude(cut_extrude13_sk1.sketch, amount=-CUT_EXTRUDE13_REACH, mode=Mode.PRIVATE) & part.part
    # Sketch21 → Cut-Extrude13 (cut, up to next)
    with BuildSketch(Plane(origin=(0, 0, -19.05), x_dir=(-1, 0, 0), z_dir=(0, 0, -1)), mode=Mode.PRIVATE) as cut_extrude13_sk2:
        with Locations((-22.575, 57.15)):
            Circle(SKETCH21_R)
    cut_extrude13_tool2 = extrude(cut_extrude13_sk2.sketch, amount=-CUT_EXTRUDE13_REACH, mode=Mode.PRIVATE) & part.part
    add(cut_extrude13_tool1.solids().sort_by_distance((-22.575, 57.15, -19.05))[0], mode=Mode.SUBTRACT)
    add(cut_extrude13_tool2.solids().sort_by_distance((22.575, 57.15, -19.05))[0], mode=Mode.SUBTRACT)


solid = part.part
